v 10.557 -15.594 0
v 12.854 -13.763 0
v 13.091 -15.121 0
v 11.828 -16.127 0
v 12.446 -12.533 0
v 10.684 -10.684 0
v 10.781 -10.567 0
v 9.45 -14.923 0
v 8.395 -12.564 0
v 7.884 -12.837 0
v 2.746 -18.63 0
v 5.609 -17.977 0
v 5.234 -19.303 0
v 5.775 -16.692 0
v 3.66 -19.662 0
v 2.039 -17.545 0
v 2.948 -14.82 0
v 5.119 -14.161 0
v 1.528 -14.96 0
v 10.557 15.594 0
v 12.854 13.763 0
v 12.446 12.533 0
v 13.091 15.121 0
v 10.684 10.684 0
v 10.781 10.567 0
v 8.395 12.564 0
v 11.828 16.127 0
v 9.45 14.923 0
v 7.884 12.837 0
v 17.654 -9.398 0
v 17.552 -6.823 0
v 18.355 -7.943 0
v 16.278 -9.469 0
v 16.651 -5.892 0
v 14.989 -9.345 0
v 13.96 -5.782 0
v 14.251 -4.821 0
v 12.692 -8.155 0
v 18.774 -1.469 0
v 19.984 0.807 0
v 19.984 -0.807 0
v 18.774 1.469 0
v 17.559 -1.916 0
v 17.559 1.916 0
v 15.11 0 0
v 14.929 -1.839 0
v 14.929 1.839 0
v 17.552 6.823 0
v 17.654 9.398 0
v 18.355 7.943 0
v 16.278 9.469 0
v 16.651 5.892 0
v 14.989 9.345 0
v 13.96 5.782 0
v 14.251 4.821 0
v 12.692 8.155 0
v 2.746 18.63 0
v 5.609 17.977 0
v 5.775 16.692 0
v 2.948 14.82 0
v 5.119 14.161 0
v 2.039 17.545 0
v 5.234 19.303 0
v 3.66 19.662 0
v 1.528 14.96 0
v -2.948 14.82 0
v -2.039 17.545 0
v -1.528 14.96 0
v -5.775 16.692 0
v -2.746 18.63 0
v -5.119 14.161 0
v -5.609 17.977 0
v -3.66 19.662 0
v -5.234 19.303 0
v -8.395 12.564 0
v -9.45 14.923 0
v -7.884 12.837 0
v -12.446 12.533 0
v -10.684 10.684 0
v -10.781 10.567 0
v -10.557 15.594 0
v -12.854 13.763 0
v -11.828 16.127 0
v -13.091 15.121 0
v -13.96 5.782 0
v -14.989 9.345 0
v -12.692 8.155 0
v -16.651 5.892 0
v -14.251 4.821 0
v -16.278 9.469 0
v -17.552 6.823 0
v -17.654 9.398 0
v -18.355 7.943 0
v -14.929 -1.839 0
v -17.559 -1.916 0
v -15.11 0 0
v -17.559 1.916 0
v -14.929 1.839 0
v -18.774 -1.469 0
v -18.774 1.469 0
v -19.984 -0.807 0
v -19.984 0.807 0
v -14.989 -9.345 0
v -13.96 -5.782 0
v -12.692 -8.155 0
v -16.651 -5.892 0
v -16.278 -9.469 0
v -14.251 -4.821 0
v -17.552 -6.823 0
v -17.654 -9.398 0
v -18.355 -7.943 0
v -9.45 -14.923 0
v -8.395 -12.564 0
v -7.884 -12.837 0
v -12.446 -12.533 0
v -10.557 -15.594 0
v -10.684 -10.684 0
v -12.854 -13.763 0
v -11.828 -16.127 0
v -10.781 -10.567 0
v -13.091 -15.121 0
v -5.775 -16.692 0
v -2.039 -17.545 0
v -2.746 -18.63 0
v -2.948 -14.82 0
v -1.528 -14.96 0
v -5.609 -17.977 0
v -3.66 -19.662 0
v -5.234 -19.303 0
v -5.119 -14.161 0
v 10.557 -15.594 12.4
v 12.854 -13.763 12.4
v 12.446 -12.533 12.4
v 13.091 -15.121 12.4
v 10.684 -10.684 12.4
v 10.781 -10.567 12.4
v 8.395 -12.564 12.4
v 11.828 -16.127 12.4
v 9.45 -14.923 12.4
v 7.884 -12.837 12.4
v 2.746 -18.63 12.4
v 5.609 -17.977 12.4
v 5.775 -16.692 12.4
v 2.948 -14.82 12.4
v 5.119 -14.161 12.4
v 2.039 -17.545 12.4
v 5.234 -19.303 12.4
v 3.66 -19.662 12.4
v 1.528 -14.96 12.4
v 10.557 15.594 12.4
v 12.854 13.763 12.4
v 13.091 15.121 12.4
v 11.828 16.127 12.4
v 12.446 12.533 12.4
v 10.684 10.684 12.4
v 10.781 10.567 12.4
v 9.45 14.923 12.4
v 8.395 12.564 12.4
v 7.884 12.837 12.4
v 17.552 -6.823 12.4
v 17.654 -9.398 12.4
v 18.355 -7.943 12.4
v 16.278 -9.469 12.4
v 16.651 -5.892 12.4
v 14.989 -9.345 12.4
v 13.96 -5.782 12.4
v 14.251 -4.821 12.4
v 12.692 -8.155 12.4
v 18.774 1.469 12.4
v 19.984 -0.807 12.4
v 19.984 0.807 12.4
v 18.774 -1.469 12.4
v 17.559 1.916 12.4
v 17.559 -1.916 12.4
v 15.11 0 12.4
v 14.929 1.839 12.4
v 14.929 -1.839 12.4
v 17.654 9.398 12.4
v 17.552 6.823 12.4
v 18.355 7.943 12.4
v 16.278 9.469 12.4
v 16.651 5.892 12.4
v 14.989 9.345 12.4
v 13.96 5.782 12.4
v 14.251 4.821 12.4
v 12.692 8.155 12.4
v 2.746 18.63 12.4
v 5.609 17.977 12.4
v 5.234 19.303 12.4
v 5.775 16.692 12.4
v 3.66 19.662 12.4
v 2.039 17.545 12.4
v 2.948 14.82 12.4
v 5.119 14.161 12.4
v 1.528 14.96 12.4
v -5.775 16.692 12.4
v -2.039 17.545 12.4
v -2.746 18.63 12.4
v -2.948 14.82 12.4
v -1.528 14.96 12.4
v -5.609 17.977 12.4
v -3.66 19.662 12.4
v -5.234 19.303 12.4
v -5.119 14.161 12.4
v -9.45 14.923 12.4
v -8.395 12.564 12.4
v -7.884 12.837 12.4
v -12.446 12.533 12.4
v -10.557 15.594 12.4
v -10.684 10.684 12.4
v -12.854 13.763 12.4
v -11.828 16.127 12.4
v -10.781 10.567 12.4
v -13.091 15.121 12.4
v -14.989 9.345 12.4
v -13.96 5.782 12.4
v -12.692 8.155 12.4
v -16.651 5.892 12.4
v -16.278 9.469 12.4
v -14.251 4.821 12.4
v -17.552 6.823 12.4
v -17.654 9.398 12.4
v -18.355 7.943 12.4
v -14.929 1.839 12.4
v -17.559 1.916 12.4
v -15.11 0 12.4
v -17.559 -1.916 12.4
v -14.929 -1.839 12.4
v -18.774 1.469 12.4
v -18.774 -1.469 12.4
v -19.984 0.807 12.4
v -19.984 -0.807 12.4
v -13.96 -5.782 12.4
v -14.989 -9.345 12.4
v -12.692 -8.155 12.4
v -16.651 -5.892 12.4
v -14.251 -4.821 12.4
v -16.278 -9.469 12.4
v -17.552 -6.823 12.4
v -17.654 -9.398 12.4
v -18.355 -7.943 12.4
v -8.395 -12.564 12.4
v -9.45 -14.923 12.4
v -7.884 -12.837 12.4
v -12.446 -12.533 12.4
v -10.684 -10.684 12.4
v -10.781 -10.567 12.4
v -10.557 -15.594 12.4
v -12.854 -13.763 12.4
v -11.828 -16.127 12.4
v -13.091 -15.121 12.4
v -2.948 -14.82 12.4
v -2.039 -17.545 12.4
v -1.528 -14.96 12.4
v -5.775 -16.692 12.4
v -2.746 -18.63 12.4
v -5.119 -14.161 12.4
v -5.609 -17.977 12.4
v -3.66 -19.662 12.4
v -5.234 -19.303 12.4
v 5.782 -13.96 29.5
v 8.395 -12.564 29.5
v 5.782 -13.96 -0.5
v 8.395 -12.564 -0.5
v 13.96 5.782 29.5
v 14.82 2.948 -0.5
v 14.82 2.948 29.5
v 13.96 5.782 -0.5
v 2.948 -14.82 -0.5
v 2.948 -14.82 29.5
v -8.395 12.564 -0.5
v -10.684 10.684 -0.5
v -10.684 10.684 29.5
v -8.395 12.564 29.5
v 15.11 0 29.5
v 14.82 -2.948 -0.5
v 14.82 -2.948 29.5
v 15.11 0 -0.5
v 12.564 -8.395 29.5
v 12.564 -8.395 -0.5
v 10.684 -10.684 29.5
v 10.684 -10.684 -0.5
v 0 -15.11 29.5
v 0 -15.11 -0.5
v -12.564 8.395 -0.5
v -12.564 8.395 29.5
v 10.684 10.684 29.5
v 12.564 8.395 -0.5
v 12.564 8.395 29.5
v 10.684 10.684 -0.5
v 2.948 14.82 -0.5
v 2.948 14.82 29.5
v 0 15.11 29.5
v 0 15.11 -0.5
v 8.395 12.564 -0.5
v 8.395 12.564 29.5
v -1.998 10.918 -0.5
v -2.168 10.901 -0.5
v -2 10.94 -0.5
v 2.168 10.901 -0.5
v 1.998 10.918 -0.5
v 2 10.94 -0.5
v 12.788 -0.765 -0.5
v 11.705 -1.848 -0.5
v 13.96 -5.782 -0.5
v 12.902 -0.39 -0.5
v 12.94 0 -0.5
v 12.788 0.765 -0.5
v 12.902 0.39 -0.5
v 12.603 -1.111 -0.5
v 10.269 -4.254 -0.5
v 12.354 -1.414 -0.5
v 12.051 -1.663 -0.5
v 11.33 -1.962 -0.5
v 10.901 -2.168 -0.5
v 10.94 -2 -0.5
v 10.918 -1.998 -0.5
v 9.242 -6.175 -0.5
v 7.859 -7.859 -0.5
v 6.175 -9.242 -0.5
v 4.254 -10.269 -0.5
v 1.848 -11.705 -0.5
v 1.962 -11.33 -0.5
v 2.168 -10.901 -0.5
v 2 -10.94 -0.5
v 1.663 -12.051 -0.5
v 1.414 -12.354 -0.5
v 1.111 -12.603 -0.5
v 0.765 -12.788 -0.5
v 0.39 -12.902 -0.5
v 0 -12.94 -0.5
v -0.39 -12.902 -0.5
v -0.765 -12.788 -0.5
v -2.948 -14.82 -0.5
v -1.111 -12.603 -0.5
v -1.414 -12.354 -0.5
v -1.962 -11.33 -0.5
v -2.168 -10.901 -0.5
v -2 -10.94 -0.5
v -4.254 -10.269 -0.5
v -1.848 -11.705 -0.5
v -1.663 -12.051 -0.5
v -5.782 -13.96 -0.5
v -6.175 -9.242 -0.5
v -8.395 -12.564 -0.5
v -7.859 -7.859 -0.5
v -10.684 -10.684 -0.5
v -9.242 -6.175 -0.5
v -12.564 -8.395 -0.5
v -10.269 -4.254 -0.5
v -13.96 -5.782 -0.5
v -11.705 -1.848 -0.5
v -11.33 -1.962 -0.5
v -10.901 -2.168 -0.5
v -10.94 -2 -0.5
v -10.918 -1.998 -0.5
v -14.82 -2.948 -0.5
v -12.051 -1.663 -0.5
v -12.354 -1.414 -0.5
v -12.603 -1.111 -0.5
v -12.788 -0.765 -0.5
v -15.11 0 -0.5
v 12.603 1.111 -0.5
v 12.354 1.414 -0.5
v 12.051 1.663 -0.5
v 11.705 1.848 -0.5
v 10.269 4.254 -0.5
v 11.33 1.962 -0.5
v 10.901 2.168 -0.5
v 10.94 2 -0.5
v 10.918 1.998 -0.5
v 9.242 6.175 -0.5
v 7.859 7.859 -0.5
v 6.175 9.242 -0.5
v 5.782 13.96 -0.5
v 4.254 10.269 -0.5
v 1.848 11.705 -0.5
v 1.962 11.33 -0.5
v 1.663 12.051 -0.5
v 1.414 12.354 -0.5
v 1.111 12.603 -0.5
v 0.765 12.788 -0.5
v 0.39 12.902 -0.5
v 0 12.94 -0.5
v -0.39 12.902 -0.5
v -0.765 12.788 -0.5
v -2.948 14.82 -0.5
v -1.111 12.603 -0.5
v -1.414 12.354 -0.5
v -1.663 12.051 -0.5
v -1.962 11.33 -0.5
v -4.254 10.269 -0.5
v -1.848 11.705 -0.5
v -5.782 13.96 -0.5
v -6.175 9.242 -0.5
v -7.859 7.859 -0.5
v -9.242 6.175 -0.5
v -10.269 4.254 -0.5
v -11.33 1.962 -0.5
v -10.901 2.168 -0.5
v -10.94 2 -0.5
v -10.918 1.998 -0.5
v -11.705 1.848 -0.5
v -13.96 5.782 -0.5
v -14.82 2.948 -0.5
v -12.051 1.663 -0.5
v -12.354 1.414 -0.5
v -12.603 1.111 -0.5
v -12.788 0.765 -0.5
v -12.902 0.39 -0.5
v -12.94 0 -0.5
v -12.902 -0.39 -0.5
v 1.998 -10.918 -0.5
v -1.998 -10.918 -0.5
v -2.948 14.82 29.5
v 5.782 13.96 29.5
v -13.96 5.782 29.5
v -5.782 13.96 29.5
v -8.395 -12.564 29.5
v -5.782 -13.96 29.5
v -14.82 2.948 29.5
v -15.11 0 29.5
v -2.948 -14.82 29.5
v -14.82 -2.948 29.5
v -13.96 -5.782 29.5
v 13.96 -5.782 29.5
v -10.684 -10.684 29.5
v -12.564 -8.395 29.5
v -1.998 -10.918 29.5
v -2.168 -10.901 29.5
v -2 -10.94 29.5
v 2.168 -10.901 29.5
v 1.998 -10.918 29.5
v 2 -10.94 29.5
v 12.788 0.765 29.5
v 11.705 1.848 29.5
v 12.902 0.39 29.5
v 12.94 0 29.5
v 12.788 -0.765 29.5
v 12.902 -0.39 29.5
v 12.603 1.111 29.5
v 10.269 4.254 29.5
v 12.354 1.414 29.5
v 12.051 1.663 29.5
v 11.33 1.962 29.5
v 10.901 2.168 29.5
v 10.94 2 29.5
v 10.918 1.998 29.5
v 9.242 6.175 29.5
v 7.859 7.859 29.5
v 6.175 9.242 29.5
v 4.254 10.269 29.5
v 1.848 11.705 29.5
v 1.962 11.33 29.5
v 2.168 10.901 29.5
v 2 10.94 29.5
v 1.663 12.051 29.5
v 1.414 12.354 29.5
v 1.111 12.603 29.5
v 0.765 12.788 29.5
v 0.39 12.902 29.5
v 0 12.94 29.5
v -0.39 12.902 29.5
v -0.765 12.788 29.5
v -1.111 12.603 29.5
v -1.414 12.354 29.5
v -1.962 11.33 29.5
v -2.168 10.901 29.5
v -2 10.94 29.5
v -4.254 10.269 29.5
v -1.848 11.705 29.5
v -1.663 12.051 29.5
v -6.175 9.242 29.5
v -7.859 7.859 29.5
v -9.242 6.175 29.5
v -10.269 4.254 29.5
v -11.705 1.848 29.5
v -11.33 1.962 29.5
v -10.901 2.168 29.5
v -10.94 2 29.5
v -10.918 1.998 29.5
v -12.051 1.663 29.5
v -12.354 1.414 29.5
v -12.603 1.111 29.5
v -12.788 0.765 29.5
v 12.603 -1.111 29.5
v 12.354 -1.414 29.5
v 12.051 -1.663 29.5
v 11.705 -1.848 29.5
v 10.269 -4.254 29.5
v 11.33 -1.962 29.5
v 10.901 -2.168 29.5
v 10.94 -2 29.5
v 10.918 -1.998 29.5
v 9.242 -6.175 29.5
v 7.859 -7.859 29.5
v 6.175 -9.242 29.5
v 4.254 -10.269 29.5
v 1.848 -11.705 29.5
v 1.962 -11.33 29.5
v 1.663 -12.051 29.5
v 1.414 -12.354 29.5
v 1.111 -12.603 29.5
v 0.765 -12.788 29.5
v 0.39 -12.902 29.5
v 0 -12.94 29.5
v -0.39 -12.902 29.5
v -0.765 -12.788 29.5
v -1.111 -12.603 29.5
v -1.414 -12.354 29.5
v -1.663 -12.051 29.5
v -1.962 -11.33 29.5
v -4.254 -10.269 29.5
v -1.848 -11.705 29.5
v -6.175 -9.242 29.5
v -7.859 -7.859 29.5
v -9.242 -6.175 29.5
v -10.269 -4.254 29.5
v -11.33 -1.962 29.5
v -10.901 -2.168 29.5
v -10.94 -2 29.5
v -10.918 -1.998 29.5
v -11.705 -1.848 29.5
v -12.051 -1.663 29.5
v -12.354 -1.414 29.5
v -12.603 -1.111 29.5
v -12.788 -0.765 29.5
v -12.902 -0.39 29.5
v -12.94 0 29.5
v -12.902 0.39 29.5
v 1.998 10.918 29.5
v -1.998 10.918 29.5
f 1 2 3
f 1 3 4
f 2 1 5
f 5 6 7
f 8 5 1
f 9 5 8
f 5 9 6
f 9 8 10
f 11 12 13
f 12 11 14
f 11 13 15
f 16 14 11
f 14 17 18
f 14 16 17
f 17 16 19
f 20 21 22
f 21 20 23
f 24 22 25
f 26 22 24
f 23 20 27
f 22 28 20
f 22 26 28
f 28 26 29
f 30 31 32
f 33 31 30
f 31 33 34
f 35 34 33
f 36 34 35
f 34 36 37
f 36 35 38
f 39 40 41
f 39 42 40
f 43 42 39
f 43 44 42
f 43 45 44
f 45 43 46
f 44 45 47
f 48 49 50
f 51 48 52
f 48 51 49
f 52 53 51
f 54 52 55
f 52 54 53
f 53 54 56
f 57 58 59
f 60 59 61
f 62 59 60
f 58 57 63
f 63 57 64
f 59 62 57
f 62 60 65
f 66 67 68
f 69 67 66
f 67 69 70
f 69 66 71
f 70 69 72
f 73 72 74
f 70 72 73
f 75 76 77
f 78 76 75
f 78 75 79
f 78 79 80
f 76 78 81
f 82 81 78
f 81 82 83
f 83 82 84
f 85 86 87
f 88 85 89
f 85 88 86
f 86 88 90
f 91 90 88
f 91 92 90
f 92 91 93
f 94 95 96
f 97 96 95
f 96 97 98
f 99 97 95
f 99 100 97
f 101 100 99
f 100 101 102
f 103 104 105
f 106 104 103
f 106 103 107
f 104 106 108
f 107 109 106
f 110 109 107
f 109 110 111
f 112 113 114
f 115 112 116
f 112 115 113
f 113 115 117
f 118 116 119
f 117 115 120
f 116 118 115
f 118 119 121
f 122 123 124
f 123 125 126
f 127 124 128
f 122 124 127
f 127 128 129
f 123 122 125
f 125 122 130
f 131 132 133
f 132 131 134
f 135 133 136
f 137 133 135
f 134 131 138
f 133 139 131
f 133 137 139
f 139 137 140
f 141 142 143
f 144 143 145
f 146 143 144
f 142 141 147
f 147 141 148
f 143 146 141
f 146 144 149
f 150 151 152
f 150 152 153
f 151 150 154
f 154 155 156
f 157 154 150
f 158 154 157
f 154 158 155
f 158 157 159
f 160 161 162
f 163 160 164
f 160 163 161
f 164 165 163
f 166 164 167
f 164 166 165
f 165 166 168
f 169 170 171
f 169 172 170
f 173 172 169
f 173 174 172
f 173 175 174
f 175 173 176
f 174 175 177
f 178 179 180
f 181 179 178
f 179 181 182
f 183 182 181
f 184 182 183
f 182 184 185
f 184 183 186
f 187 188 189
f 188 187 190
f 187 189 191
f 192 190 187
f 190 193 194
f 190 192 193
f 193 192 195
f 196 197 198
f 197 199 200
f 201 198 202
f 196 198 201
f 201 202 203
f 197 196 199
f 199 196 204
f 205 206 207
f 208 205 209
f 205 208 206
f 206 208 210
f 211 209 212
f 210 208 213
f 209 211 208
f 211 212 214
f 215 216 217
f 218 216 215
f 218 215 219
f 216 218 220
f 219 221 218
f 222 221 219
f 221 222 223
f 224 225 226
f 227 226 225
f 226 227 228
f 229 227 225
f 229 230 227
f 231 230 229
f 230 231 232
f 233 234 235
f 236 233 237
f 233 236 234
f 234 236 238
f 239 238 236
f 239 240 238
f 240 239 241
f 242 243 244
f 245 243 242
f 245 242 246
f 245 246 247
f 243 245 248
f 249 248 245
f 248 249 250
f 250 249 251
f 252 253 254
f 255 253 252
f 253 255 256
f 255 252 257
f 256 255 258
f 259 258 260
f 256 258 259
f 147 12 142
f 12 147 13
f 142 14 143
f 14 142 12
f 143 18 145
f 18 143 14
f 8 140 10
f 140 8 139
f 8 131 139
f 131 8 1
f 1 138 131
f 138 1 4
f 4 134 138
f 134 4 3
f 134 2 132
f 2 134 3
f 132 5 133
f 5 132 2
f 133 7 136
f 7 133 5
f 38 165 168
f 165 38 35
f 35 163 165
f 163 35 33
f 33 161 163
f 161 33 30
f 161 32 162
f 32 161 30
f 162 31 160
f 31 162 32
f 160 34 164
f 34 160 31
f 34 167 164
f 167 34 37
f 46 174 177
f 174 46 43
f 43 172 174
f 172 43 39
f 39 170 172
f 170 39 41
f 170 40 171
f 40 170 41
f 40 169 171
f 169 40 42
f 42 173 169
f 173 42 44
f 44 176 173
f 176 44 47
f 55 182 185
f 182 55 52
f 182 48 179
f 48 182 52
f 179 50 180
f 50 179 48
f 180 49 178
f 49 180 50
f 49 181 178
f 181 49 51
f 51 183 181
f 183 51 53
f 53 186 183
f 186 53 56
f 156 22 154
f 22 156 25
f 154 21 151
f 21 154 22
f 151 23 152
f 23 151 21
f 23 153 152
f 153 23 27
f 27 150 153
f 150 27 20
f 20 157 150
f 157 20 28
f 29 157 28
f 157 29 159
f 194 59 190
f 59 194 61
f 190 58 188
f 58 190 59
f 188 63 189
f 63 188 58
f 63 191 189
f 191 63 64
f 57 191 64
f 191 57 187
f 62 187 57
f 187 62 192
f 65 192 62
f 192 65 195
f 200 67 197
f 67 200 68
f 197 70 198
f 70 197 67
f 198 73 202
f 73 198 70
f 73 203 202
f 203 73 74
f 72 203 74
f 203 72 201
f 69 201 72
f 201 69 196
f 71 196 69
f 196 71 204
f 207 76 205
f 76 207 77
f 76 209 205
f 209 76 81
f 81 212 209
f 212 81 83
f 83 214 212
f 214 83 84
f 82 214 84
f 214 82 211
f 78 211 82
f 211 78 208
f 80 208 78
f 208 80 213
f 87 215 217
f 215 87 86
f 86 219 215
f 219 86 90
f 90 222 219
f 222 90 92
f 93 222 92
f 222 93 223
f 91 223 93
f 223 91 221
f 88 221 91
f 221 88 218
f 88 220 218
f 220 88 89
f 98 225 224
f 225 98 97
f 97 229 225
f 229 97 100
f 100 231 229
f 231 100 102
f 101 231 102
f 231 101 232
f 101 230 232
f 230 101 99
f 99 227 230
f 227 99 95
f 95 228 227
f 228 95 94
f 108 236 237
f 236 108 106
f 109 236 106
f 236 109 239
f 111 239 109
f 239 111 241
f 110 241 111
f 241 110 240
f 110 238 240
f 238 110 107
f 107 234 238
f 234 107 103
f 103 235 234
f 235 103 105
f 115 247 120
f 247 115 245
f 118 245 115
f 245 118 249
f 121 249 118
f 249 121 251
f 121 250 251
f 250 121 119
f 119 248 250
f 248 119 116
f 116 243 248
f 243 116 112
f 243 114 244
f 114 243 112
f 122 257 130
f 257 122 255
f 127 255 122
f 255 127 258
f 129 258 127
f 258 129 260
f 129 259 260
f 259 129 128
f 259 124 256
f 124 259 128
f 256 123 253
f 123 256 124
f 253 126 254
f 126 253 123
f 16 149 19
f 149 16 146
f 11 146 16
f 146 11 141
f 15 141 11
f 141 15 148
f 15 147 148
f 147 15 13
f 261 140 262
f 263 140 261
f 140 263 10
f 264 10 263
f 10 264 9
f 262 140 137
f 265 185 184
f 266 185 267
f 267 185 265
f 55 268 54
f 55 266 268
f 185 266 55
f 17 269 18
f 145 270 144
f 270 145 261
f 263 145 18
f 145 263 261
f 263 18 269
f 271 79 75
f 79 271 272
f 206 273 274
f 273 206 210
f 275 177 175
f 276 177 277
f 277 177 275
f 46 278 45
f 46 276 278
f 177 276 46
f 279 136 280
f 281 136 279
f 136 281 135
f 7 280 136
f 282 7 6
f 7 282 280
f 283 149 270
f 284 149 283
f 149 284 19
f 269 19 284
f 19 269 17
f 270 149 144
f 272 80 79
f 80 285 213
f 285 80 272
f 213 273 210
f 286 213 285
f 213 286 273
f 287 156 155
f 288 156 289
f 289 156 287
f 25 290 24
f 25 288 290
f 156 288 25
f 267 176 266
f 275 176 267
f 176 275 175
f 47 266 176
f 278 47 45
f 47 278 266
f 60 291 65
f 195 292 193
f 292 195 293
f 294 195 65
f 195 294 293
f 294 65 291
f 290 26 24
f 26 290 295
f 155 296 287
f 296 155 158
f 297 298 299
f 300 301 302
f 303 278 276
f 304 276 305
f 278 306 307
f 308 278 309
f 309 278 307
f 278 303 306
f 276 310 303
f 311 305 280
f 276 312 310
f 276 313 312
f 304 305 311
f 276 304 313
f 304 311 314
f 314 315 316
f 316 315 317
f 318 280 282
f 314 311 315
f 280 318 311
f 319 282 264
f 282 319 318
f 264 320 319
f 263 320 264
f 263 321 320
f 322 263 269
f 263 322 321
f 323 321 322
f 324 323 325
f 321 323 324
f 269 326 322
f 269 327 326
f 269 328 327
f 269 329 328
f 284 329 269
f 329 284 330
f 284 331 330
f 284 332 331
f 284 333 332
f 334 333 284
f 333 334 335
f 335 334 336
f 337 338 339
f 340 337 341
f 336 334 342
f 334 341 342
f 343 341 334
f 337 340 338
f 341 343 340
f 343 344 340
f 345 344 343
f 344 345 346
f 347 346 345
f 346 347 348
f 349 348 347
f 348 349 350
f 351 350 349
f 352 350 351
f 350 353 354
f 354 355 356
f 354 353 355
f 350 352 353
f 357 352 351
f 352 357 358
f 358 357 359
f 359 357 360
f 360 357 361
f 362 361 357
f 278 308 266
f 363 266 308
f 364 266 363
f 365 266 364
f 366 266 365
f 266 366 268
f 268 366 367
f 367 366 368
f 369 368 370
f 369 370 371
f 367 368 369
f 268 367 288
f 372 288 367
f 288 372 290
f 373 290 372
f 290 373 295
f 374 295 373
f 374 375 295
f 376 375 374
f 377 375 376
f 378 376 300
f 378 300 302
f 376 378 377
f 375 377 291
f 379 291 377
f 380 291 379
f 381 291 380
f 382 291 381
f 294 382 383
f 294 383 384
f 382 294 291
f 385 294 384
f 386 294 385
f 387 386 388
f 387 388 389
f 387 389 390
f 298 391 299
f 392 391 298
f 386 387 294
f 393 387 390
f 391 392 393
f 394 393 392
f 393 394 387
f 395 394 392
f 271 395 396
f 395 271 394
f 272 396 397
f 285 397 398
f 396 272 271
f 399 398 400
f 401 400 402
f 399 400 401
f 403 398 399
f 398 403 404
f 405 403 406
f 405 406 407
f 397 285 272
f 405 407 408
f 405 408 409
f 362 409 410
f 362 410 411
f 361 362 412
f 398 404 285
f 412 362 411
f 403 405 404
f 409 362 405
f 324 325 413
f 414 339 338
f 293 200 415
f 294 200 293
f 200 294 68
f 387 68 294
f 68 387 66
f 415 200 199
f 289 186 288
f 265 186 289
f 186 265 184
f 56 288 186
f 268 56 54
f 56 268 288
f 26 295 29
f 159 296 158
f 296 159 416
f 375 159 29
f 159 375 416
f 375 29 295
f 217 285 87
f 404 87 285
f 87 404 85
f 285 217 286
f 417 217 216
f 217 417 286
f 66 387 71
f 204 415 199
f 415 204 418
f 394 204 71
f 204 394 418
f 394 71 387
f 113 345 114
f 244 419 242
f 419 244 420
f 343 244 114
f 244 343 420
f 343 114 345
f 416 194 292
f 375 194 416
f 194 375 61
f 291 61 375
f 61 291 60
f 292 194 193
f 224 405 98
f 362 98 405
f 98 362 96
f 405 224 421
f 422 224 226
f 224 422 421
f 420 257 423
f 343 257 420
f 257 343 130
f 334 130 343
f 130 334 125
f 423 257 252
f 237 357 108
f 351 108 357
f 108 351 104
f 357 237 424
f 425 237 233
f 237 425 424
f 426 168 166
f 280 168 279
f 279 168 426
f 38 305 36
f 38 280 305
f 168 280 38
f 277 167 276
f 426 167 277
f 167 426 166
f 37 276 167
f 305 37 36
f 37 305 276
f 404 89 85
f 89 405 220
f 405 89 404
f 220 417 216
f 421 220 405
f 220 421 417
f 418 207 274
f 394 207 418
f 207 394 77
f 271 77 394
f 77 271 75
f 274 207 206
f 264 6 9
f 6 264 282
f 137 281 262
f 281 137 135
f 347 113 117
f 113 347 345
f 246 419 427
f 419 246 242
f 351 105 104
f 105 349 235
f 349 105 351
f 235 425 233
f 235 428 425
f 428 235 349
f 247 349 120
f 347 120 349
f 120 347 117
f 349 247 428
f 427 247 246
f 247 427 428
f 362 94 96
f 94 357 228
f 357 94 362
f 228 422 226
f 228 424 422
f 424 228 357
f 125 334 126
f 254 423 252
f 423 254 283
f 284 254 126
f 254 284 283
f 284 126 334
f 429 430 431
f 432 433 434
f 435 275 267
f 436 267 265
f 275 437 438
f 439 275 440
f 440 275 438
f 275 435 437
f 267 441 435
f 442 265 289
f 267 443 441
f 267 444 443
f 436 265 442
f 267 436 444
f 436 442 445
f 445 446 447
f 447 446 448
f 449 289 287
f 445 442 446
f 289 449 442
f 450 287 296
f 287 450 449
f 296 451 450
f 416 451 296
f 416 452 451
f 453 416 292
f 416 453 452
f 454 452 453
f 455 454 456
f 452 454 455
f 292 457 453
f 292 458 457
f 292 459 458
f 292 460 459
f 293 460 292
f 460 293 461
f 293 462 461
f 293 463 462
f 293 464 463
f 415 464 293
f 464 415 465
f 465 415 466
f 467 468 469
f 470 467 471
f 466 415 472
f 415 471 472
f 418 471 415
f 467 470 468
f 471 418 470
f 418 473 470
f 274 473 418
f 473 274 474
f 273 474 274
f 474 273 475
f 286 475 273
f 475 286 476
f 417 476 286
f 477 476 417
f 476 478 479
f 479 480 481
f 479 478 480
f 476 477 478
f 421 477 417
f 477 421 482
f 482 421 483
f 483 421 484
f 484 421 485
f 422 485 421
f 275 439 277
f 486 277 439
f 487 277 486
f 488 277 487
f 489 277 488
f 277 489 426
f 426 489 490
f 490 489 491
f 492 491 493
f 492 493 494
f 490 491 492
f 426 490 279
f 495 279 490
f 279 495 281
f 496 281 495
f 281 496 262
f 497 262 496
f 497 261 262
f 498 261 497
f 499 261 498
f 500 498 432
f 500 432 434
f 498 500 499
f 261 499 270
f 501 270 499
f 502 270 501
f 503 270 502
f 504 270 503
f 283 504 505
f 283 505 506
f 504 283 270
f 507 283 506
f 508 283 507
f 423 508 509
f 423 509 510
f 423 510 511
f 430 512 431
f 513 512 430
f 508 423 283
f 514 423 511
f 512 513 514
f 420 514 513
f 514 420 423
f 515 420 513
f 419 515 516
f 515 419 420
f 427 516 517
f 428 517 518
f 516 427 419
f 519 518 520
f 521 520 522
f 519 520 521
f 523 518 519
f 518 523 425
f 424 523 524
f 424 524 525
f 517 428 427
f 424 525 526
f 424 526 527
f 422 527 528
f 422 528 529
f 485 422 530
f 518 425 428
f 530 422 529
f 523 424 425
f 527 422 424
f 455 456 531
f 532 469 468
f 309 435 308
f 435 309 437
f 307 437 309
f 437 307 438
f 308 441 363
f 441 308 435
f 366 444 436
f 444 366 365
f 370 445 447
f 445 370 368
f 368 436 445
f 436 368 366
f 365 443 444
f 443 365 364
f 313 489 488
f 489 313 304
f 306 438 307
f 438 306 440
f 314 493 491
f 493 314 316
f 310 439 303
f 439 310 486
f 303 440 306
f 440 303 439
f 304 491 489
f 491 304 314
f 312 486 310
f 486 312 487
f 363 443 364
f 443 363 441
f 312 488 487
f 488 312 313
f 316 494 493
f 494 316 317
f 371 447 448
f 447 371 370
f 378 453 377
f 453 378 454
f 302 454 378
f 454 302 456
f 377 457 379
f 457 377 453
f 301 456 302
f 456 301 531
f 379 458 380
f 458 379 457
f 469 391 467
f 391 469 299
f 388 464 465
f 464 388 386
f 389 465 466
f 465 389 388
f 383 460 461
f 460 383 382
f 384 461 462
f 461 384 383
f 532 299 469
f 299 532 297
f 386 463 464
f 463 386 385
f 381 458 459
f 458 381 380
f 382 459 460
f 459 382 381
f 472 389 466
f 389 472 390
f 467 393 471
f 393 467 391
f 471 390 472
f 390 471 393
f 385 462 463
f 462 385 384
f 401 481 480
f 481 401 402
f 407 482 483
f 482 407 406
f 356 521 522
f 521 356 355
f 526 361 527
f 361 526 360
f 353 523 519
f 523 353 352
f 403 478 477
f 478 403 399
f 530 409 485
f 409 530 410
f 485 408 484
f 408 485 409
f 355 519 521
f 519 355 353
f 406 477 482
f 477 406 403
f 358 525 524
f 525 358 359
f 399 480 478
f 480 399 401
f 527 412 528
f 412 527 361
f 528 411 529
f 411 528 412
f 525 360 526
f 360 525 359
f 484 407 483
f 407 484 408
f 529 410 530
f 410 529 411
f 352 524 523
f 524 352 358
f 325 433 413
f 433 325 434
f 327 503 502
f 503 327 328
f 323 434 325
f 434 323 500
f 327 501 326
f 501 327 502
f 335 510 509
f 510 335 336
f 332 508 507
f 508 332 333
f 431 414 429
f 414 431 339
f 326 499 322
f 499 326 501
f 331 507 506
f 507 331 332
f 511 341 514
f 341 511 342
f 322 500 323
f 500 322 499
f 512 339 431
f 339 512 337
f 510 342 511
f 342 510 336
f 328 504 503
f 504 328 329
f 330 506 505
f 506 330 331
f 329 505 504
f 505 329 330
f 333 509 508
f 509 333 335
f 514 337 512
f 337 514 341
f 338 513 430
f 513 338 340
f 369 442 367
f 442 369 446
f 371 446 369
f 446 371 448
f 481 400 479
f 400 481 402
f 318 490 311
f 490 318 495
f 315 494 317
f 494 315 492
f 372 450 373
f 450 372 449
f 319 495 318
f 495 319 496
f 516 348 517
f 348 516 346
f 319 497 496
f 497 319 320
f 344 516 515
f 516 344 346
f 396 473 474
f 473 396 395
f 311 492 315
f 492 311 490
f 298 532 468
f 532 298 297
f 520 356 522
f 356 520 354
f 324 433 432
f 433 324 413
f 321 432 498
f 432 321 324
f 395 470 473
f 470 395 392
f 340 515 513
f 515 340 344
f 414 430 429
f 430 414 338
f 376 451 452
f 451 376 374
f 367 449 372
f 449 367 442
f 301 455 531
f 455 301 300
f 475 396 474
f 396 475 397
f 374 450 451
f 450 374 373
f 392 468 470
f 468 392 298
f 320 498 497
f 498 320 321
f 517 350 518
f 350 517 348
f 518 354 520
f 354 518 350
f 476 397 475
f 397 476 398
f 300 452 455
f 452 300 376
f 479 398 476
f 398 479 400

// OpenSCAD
$fn = 32;

// ----------------------------------------------------------------------
// Two-module gear rim: z14 m2.5 and z18 m1.5, 29 mm wide
// ----------------------------------------------------------------------

// --- parameters (mm) ---
module_a = 2.5;           // first tooth module
teeth_a = 14;             // first band tooth count
module_b = 1.5;           // second tooth module
teeth_b = 18;             // second band tooth count
band_h = 12;              // height of one tooth band
web_t = 5;                // web thickness between the bands
total = 29;               // overall width over both bands
root_r = 14.38;           // root radius of the coarse band
hub_r = 15.11;            // hub radius
bore_d = 22.23;           // hub bore
hole_count = 4;           // lightening holes
hole_r = 10.94;           // lightening hole circle radius
hole_d = 4;               // lightening hole diameter

band_a = [[14.259, -1.82], [17.559, -1.916], [18.774, -1.469], [19.984, -0.807], [19.984, 0.807], [18.774, 1.469], [17.559, 1.916], [14.259, 1.82], [13.637, 4.547], [16.651, 5.892], [17.552, 6.823], [18.355, 7.943], [17.654, 9.398], [16.278, 9.469], [14.989, 9.345], [12.058, 7.827], [10.313, 10.014], [12.446, 12.533], [12.854, 13.763], [13.091, 15.121], [11.828, 16.127], [10.557, 15.594], [9.45, 14.923], [7.468, 12.283], [4.947, 13.497], [5.775, 16.692], [5.609, 17.977], [5.234, 19.303], [3.66, 19.662], [2.746, 18.63], [2.039, 17.545], [1.399, 14.307], [-1.399, 14.307], [-2.039, 17.545], [-2.746, 18.63], [-3.66, 19.662], [-5.234, 19.303], [-5.609, 17.977], [-5.775, 16.692], [-4.947, 13.497], [-7.468, 12.283], [-9.45, 14.923], [-10.557, 15.594], [-11.828, 16.127], [-13.091, 15.121], [-12.854, 13.763], [-12.446, 12.533], [-10.313, 10.014], [-12.058, 7.827], [-14.989, 9.345], [-16.278, 9.469], [-17.654, 9.398], [-18.355, 7.943], [-17.552, 6.823], [-16.651, 5.892], [-13.637, 4.547], [-14.259, 1.82], [-17.559, 1.916], [-18.774, 1.469], [-19.984, 0.807], [-19.984, -0.807], [-18.774, -1.469], [-17.559, -1.916], [-14.259, -1.82], [-13.637, -4.547], [-16.651, -5.892], [-17.552, -6.823], [-18.355, -7.943], [-17.654, -9.398], [-16.278, -9.469], [-14.989, -9.345], [-12.058, -7.827], [-10.313, -10.014], [-12.446, -12.533], [-12.854, -13.763], [-13.091, -15.121], [-11.828, -16.127], [-10.557, -15.594], [-9.45, -14.923], [-7.468, -12.283], [-4.947, -13.497], [-5.775, -16.692], [-5.609, -17.977], [-5.234, -19.303], [-3.66, -19.662], [-2.746, -18.63], [-2.039, -17.545], [-1.399, -14.307], [1.399, -14.307], [2.039, -17.545], [2.746, -18.63], [3.66, -19.662], [5.234, -19.303], [5.609, -17.977], [5.775, -16.692], [4.947, -13.497], [7.468, -12.283], [9.45, -14.923], [10.557, -15.594], [11.828, -16.127], [13.091, -15.121], [12.854, -13.763], [12.446, -12.533], [10.313, -10.014], [12.058, -7.827], [14.989, -9.345], [16.278, -9.469], [17.654, -9.398], [18.355, -7.943], [17.552, -6.823], [16.651, -5.892], [13.637, -4.547]];
band_b = [[11.565, -1.183], [13.439, -1.179], [14.216, -0.906], [14.991, -0.511], [14.991, 0.511], [14.216, 0.906], [13.439, 1.179], [11.565, 1.183], [11.272, 2.844], [13.032, 3.488], [13.669, 4.011], [14.262, 4.647], [13.912, 5.608], [13.049, 5.713], [12.225, 5.704], [10.463, 5.067], [9.619, 6.527], [11.053, 7.735], [11.473, 8.444], [11.813, 9.245], [11.155, 10.028], [10.308, 9.832], [9.537, 9.542], [8.099, 8.34], [6.807, 9.424], [7.741, 11.049], [7.892, 11.859], [7.938, 12.727], [7.053, 13.238], [6.324, 12.765], [5.698, 12.228], [4.758, 10.607], [3.173, 11.184], [3.495, 13.03], [3.36, 13.843], [3.107, 14.675], [2.1, 14.852], [1.577, 14.158], [1.172, 13.44], [0.843, 11.594], [-0.843, 11.594], [-1.172, 13.44], [-1.577, 14.158], [-2.1, 14.852], [-3.107, 14.675], [-3.36, 13.843], [-3.495, 13.03], [-3.173, 11.184], [-4.758, 10.607], [-5.698, 12.228], [-6.324, 12.765], [-7.053, 13.238], [-7.938, 12.727], [-7.892, 11.859], [-7.741, 11.049], [-6.807, 9.424], [-8.099, 8.34], [-9.537, 9.542], [-10.308, 9.832], [-11.155, 10.028], [-11.813, 9.245], [-11.473, 8.444], [-11.053, 7.735], [-9.619, 6.527], [-10.463, 5.067], [-12.225, 5.704], [-13.049, 5.713], [-13.912, 5.608], [-14.262, 4.647], [-13.669, 4.011], [-13.032, 3.488], [-11.272, 2.844], [-11.565, 1.183], [-13.439, 1.179], [-14.216, 0.906], [-14.991, 0.511], [-14.991, -0.511], [-14.216, -0.906], [-13.439, -1.179], [-11.565, -1.183], [-11.272, -2.844], [-13.032, -3.488], [-13.669, -4.011], [-14.262, -4.647], [-13.912, -5.608], [-13.049, -5.713], [-12.225, -5.704], [-10.463, -5.067], [-9.619, -6.527], [-11.053, -7.735], [-11.473, -8.444], [-11.813, -9.245], [-11.155, -10.028], [-10.308, -9.832], [-9.537, -9.542], [-8.099, -8.34], [-6.807, -9.424], [-7.741, -11.049], [-7.892, -11.859], [-7.938, -12.727], [-7.053, -13.238], [-6.324, -12.765], [-5.698, -12.228], [-4.758, -10.607], [-3.173, -11.184], [-3.495, -13.03], [-3.36, -13.843], [-3.107, -14.675], [-2.1, -14.852], [-1.577, -14.158], [-1.172, -13.44], [-0.843, -11.594], [0.843, -11.594], [1.172, -13.44], [1.577, -14.158], [2.1, -14.852], [3.107, -14.675], [3.36, -13.843], [3.495, -13.03], [3.173, -11.184], [4.758, -10.607], [5.698, -12.228], [6.324, -12.765], [7.053, -13.238], [7.938, -12.727], [7.892, -11.859], [7.741, -11.049], [6.807, -9.424], [8.099, -8.34], [9.537, -9.542], [10.308, -9.832], [11.155, -10.028], [11.813, -9.245], [11.473, -8.444], [11.053, -7.735], [9.619, -6.527], [10.463, -5.067], [12.225, -5.704], [13.049, -5.713], [13.912, -5.608], [14.262, -4.647], [13.669, -4.011], [13.032, -3.488], [11.272, -2.844]];

difference() {
  union() {
    /* tooth band A, overlapping the web by 0.4 mm */
    linear_extrude(height = band_h + 0.4) polygon(band_a);
    /* web */
    translate([0, 0, band_h - 0.4]) cylinder(h = web_t + 0.8, d = 2 * root_r);
    /* tooth band B */
    translate([0, 0, band_h + web_t]) linear_extrude(height = band_h + 0.4) polygon(band_b);
    /* hub */
    translate([0, 0, -0.5]) cylinder(h = total + 1.0, d = 2 * hub_r);
  }
  /* bore */
  translate([0, 0, -2.5]) cylinder(h = total + 5, d = bore_d);
  /* lightening holes through the web */
  for (i = [0 : hole_count - 1]) {
    a = i * 360 / hole_count;
    translate([hole_r * cos(a), hole_r * sin(a), -2.5]) cylinder(h = total + 5, d = hole_d);
  }
}
